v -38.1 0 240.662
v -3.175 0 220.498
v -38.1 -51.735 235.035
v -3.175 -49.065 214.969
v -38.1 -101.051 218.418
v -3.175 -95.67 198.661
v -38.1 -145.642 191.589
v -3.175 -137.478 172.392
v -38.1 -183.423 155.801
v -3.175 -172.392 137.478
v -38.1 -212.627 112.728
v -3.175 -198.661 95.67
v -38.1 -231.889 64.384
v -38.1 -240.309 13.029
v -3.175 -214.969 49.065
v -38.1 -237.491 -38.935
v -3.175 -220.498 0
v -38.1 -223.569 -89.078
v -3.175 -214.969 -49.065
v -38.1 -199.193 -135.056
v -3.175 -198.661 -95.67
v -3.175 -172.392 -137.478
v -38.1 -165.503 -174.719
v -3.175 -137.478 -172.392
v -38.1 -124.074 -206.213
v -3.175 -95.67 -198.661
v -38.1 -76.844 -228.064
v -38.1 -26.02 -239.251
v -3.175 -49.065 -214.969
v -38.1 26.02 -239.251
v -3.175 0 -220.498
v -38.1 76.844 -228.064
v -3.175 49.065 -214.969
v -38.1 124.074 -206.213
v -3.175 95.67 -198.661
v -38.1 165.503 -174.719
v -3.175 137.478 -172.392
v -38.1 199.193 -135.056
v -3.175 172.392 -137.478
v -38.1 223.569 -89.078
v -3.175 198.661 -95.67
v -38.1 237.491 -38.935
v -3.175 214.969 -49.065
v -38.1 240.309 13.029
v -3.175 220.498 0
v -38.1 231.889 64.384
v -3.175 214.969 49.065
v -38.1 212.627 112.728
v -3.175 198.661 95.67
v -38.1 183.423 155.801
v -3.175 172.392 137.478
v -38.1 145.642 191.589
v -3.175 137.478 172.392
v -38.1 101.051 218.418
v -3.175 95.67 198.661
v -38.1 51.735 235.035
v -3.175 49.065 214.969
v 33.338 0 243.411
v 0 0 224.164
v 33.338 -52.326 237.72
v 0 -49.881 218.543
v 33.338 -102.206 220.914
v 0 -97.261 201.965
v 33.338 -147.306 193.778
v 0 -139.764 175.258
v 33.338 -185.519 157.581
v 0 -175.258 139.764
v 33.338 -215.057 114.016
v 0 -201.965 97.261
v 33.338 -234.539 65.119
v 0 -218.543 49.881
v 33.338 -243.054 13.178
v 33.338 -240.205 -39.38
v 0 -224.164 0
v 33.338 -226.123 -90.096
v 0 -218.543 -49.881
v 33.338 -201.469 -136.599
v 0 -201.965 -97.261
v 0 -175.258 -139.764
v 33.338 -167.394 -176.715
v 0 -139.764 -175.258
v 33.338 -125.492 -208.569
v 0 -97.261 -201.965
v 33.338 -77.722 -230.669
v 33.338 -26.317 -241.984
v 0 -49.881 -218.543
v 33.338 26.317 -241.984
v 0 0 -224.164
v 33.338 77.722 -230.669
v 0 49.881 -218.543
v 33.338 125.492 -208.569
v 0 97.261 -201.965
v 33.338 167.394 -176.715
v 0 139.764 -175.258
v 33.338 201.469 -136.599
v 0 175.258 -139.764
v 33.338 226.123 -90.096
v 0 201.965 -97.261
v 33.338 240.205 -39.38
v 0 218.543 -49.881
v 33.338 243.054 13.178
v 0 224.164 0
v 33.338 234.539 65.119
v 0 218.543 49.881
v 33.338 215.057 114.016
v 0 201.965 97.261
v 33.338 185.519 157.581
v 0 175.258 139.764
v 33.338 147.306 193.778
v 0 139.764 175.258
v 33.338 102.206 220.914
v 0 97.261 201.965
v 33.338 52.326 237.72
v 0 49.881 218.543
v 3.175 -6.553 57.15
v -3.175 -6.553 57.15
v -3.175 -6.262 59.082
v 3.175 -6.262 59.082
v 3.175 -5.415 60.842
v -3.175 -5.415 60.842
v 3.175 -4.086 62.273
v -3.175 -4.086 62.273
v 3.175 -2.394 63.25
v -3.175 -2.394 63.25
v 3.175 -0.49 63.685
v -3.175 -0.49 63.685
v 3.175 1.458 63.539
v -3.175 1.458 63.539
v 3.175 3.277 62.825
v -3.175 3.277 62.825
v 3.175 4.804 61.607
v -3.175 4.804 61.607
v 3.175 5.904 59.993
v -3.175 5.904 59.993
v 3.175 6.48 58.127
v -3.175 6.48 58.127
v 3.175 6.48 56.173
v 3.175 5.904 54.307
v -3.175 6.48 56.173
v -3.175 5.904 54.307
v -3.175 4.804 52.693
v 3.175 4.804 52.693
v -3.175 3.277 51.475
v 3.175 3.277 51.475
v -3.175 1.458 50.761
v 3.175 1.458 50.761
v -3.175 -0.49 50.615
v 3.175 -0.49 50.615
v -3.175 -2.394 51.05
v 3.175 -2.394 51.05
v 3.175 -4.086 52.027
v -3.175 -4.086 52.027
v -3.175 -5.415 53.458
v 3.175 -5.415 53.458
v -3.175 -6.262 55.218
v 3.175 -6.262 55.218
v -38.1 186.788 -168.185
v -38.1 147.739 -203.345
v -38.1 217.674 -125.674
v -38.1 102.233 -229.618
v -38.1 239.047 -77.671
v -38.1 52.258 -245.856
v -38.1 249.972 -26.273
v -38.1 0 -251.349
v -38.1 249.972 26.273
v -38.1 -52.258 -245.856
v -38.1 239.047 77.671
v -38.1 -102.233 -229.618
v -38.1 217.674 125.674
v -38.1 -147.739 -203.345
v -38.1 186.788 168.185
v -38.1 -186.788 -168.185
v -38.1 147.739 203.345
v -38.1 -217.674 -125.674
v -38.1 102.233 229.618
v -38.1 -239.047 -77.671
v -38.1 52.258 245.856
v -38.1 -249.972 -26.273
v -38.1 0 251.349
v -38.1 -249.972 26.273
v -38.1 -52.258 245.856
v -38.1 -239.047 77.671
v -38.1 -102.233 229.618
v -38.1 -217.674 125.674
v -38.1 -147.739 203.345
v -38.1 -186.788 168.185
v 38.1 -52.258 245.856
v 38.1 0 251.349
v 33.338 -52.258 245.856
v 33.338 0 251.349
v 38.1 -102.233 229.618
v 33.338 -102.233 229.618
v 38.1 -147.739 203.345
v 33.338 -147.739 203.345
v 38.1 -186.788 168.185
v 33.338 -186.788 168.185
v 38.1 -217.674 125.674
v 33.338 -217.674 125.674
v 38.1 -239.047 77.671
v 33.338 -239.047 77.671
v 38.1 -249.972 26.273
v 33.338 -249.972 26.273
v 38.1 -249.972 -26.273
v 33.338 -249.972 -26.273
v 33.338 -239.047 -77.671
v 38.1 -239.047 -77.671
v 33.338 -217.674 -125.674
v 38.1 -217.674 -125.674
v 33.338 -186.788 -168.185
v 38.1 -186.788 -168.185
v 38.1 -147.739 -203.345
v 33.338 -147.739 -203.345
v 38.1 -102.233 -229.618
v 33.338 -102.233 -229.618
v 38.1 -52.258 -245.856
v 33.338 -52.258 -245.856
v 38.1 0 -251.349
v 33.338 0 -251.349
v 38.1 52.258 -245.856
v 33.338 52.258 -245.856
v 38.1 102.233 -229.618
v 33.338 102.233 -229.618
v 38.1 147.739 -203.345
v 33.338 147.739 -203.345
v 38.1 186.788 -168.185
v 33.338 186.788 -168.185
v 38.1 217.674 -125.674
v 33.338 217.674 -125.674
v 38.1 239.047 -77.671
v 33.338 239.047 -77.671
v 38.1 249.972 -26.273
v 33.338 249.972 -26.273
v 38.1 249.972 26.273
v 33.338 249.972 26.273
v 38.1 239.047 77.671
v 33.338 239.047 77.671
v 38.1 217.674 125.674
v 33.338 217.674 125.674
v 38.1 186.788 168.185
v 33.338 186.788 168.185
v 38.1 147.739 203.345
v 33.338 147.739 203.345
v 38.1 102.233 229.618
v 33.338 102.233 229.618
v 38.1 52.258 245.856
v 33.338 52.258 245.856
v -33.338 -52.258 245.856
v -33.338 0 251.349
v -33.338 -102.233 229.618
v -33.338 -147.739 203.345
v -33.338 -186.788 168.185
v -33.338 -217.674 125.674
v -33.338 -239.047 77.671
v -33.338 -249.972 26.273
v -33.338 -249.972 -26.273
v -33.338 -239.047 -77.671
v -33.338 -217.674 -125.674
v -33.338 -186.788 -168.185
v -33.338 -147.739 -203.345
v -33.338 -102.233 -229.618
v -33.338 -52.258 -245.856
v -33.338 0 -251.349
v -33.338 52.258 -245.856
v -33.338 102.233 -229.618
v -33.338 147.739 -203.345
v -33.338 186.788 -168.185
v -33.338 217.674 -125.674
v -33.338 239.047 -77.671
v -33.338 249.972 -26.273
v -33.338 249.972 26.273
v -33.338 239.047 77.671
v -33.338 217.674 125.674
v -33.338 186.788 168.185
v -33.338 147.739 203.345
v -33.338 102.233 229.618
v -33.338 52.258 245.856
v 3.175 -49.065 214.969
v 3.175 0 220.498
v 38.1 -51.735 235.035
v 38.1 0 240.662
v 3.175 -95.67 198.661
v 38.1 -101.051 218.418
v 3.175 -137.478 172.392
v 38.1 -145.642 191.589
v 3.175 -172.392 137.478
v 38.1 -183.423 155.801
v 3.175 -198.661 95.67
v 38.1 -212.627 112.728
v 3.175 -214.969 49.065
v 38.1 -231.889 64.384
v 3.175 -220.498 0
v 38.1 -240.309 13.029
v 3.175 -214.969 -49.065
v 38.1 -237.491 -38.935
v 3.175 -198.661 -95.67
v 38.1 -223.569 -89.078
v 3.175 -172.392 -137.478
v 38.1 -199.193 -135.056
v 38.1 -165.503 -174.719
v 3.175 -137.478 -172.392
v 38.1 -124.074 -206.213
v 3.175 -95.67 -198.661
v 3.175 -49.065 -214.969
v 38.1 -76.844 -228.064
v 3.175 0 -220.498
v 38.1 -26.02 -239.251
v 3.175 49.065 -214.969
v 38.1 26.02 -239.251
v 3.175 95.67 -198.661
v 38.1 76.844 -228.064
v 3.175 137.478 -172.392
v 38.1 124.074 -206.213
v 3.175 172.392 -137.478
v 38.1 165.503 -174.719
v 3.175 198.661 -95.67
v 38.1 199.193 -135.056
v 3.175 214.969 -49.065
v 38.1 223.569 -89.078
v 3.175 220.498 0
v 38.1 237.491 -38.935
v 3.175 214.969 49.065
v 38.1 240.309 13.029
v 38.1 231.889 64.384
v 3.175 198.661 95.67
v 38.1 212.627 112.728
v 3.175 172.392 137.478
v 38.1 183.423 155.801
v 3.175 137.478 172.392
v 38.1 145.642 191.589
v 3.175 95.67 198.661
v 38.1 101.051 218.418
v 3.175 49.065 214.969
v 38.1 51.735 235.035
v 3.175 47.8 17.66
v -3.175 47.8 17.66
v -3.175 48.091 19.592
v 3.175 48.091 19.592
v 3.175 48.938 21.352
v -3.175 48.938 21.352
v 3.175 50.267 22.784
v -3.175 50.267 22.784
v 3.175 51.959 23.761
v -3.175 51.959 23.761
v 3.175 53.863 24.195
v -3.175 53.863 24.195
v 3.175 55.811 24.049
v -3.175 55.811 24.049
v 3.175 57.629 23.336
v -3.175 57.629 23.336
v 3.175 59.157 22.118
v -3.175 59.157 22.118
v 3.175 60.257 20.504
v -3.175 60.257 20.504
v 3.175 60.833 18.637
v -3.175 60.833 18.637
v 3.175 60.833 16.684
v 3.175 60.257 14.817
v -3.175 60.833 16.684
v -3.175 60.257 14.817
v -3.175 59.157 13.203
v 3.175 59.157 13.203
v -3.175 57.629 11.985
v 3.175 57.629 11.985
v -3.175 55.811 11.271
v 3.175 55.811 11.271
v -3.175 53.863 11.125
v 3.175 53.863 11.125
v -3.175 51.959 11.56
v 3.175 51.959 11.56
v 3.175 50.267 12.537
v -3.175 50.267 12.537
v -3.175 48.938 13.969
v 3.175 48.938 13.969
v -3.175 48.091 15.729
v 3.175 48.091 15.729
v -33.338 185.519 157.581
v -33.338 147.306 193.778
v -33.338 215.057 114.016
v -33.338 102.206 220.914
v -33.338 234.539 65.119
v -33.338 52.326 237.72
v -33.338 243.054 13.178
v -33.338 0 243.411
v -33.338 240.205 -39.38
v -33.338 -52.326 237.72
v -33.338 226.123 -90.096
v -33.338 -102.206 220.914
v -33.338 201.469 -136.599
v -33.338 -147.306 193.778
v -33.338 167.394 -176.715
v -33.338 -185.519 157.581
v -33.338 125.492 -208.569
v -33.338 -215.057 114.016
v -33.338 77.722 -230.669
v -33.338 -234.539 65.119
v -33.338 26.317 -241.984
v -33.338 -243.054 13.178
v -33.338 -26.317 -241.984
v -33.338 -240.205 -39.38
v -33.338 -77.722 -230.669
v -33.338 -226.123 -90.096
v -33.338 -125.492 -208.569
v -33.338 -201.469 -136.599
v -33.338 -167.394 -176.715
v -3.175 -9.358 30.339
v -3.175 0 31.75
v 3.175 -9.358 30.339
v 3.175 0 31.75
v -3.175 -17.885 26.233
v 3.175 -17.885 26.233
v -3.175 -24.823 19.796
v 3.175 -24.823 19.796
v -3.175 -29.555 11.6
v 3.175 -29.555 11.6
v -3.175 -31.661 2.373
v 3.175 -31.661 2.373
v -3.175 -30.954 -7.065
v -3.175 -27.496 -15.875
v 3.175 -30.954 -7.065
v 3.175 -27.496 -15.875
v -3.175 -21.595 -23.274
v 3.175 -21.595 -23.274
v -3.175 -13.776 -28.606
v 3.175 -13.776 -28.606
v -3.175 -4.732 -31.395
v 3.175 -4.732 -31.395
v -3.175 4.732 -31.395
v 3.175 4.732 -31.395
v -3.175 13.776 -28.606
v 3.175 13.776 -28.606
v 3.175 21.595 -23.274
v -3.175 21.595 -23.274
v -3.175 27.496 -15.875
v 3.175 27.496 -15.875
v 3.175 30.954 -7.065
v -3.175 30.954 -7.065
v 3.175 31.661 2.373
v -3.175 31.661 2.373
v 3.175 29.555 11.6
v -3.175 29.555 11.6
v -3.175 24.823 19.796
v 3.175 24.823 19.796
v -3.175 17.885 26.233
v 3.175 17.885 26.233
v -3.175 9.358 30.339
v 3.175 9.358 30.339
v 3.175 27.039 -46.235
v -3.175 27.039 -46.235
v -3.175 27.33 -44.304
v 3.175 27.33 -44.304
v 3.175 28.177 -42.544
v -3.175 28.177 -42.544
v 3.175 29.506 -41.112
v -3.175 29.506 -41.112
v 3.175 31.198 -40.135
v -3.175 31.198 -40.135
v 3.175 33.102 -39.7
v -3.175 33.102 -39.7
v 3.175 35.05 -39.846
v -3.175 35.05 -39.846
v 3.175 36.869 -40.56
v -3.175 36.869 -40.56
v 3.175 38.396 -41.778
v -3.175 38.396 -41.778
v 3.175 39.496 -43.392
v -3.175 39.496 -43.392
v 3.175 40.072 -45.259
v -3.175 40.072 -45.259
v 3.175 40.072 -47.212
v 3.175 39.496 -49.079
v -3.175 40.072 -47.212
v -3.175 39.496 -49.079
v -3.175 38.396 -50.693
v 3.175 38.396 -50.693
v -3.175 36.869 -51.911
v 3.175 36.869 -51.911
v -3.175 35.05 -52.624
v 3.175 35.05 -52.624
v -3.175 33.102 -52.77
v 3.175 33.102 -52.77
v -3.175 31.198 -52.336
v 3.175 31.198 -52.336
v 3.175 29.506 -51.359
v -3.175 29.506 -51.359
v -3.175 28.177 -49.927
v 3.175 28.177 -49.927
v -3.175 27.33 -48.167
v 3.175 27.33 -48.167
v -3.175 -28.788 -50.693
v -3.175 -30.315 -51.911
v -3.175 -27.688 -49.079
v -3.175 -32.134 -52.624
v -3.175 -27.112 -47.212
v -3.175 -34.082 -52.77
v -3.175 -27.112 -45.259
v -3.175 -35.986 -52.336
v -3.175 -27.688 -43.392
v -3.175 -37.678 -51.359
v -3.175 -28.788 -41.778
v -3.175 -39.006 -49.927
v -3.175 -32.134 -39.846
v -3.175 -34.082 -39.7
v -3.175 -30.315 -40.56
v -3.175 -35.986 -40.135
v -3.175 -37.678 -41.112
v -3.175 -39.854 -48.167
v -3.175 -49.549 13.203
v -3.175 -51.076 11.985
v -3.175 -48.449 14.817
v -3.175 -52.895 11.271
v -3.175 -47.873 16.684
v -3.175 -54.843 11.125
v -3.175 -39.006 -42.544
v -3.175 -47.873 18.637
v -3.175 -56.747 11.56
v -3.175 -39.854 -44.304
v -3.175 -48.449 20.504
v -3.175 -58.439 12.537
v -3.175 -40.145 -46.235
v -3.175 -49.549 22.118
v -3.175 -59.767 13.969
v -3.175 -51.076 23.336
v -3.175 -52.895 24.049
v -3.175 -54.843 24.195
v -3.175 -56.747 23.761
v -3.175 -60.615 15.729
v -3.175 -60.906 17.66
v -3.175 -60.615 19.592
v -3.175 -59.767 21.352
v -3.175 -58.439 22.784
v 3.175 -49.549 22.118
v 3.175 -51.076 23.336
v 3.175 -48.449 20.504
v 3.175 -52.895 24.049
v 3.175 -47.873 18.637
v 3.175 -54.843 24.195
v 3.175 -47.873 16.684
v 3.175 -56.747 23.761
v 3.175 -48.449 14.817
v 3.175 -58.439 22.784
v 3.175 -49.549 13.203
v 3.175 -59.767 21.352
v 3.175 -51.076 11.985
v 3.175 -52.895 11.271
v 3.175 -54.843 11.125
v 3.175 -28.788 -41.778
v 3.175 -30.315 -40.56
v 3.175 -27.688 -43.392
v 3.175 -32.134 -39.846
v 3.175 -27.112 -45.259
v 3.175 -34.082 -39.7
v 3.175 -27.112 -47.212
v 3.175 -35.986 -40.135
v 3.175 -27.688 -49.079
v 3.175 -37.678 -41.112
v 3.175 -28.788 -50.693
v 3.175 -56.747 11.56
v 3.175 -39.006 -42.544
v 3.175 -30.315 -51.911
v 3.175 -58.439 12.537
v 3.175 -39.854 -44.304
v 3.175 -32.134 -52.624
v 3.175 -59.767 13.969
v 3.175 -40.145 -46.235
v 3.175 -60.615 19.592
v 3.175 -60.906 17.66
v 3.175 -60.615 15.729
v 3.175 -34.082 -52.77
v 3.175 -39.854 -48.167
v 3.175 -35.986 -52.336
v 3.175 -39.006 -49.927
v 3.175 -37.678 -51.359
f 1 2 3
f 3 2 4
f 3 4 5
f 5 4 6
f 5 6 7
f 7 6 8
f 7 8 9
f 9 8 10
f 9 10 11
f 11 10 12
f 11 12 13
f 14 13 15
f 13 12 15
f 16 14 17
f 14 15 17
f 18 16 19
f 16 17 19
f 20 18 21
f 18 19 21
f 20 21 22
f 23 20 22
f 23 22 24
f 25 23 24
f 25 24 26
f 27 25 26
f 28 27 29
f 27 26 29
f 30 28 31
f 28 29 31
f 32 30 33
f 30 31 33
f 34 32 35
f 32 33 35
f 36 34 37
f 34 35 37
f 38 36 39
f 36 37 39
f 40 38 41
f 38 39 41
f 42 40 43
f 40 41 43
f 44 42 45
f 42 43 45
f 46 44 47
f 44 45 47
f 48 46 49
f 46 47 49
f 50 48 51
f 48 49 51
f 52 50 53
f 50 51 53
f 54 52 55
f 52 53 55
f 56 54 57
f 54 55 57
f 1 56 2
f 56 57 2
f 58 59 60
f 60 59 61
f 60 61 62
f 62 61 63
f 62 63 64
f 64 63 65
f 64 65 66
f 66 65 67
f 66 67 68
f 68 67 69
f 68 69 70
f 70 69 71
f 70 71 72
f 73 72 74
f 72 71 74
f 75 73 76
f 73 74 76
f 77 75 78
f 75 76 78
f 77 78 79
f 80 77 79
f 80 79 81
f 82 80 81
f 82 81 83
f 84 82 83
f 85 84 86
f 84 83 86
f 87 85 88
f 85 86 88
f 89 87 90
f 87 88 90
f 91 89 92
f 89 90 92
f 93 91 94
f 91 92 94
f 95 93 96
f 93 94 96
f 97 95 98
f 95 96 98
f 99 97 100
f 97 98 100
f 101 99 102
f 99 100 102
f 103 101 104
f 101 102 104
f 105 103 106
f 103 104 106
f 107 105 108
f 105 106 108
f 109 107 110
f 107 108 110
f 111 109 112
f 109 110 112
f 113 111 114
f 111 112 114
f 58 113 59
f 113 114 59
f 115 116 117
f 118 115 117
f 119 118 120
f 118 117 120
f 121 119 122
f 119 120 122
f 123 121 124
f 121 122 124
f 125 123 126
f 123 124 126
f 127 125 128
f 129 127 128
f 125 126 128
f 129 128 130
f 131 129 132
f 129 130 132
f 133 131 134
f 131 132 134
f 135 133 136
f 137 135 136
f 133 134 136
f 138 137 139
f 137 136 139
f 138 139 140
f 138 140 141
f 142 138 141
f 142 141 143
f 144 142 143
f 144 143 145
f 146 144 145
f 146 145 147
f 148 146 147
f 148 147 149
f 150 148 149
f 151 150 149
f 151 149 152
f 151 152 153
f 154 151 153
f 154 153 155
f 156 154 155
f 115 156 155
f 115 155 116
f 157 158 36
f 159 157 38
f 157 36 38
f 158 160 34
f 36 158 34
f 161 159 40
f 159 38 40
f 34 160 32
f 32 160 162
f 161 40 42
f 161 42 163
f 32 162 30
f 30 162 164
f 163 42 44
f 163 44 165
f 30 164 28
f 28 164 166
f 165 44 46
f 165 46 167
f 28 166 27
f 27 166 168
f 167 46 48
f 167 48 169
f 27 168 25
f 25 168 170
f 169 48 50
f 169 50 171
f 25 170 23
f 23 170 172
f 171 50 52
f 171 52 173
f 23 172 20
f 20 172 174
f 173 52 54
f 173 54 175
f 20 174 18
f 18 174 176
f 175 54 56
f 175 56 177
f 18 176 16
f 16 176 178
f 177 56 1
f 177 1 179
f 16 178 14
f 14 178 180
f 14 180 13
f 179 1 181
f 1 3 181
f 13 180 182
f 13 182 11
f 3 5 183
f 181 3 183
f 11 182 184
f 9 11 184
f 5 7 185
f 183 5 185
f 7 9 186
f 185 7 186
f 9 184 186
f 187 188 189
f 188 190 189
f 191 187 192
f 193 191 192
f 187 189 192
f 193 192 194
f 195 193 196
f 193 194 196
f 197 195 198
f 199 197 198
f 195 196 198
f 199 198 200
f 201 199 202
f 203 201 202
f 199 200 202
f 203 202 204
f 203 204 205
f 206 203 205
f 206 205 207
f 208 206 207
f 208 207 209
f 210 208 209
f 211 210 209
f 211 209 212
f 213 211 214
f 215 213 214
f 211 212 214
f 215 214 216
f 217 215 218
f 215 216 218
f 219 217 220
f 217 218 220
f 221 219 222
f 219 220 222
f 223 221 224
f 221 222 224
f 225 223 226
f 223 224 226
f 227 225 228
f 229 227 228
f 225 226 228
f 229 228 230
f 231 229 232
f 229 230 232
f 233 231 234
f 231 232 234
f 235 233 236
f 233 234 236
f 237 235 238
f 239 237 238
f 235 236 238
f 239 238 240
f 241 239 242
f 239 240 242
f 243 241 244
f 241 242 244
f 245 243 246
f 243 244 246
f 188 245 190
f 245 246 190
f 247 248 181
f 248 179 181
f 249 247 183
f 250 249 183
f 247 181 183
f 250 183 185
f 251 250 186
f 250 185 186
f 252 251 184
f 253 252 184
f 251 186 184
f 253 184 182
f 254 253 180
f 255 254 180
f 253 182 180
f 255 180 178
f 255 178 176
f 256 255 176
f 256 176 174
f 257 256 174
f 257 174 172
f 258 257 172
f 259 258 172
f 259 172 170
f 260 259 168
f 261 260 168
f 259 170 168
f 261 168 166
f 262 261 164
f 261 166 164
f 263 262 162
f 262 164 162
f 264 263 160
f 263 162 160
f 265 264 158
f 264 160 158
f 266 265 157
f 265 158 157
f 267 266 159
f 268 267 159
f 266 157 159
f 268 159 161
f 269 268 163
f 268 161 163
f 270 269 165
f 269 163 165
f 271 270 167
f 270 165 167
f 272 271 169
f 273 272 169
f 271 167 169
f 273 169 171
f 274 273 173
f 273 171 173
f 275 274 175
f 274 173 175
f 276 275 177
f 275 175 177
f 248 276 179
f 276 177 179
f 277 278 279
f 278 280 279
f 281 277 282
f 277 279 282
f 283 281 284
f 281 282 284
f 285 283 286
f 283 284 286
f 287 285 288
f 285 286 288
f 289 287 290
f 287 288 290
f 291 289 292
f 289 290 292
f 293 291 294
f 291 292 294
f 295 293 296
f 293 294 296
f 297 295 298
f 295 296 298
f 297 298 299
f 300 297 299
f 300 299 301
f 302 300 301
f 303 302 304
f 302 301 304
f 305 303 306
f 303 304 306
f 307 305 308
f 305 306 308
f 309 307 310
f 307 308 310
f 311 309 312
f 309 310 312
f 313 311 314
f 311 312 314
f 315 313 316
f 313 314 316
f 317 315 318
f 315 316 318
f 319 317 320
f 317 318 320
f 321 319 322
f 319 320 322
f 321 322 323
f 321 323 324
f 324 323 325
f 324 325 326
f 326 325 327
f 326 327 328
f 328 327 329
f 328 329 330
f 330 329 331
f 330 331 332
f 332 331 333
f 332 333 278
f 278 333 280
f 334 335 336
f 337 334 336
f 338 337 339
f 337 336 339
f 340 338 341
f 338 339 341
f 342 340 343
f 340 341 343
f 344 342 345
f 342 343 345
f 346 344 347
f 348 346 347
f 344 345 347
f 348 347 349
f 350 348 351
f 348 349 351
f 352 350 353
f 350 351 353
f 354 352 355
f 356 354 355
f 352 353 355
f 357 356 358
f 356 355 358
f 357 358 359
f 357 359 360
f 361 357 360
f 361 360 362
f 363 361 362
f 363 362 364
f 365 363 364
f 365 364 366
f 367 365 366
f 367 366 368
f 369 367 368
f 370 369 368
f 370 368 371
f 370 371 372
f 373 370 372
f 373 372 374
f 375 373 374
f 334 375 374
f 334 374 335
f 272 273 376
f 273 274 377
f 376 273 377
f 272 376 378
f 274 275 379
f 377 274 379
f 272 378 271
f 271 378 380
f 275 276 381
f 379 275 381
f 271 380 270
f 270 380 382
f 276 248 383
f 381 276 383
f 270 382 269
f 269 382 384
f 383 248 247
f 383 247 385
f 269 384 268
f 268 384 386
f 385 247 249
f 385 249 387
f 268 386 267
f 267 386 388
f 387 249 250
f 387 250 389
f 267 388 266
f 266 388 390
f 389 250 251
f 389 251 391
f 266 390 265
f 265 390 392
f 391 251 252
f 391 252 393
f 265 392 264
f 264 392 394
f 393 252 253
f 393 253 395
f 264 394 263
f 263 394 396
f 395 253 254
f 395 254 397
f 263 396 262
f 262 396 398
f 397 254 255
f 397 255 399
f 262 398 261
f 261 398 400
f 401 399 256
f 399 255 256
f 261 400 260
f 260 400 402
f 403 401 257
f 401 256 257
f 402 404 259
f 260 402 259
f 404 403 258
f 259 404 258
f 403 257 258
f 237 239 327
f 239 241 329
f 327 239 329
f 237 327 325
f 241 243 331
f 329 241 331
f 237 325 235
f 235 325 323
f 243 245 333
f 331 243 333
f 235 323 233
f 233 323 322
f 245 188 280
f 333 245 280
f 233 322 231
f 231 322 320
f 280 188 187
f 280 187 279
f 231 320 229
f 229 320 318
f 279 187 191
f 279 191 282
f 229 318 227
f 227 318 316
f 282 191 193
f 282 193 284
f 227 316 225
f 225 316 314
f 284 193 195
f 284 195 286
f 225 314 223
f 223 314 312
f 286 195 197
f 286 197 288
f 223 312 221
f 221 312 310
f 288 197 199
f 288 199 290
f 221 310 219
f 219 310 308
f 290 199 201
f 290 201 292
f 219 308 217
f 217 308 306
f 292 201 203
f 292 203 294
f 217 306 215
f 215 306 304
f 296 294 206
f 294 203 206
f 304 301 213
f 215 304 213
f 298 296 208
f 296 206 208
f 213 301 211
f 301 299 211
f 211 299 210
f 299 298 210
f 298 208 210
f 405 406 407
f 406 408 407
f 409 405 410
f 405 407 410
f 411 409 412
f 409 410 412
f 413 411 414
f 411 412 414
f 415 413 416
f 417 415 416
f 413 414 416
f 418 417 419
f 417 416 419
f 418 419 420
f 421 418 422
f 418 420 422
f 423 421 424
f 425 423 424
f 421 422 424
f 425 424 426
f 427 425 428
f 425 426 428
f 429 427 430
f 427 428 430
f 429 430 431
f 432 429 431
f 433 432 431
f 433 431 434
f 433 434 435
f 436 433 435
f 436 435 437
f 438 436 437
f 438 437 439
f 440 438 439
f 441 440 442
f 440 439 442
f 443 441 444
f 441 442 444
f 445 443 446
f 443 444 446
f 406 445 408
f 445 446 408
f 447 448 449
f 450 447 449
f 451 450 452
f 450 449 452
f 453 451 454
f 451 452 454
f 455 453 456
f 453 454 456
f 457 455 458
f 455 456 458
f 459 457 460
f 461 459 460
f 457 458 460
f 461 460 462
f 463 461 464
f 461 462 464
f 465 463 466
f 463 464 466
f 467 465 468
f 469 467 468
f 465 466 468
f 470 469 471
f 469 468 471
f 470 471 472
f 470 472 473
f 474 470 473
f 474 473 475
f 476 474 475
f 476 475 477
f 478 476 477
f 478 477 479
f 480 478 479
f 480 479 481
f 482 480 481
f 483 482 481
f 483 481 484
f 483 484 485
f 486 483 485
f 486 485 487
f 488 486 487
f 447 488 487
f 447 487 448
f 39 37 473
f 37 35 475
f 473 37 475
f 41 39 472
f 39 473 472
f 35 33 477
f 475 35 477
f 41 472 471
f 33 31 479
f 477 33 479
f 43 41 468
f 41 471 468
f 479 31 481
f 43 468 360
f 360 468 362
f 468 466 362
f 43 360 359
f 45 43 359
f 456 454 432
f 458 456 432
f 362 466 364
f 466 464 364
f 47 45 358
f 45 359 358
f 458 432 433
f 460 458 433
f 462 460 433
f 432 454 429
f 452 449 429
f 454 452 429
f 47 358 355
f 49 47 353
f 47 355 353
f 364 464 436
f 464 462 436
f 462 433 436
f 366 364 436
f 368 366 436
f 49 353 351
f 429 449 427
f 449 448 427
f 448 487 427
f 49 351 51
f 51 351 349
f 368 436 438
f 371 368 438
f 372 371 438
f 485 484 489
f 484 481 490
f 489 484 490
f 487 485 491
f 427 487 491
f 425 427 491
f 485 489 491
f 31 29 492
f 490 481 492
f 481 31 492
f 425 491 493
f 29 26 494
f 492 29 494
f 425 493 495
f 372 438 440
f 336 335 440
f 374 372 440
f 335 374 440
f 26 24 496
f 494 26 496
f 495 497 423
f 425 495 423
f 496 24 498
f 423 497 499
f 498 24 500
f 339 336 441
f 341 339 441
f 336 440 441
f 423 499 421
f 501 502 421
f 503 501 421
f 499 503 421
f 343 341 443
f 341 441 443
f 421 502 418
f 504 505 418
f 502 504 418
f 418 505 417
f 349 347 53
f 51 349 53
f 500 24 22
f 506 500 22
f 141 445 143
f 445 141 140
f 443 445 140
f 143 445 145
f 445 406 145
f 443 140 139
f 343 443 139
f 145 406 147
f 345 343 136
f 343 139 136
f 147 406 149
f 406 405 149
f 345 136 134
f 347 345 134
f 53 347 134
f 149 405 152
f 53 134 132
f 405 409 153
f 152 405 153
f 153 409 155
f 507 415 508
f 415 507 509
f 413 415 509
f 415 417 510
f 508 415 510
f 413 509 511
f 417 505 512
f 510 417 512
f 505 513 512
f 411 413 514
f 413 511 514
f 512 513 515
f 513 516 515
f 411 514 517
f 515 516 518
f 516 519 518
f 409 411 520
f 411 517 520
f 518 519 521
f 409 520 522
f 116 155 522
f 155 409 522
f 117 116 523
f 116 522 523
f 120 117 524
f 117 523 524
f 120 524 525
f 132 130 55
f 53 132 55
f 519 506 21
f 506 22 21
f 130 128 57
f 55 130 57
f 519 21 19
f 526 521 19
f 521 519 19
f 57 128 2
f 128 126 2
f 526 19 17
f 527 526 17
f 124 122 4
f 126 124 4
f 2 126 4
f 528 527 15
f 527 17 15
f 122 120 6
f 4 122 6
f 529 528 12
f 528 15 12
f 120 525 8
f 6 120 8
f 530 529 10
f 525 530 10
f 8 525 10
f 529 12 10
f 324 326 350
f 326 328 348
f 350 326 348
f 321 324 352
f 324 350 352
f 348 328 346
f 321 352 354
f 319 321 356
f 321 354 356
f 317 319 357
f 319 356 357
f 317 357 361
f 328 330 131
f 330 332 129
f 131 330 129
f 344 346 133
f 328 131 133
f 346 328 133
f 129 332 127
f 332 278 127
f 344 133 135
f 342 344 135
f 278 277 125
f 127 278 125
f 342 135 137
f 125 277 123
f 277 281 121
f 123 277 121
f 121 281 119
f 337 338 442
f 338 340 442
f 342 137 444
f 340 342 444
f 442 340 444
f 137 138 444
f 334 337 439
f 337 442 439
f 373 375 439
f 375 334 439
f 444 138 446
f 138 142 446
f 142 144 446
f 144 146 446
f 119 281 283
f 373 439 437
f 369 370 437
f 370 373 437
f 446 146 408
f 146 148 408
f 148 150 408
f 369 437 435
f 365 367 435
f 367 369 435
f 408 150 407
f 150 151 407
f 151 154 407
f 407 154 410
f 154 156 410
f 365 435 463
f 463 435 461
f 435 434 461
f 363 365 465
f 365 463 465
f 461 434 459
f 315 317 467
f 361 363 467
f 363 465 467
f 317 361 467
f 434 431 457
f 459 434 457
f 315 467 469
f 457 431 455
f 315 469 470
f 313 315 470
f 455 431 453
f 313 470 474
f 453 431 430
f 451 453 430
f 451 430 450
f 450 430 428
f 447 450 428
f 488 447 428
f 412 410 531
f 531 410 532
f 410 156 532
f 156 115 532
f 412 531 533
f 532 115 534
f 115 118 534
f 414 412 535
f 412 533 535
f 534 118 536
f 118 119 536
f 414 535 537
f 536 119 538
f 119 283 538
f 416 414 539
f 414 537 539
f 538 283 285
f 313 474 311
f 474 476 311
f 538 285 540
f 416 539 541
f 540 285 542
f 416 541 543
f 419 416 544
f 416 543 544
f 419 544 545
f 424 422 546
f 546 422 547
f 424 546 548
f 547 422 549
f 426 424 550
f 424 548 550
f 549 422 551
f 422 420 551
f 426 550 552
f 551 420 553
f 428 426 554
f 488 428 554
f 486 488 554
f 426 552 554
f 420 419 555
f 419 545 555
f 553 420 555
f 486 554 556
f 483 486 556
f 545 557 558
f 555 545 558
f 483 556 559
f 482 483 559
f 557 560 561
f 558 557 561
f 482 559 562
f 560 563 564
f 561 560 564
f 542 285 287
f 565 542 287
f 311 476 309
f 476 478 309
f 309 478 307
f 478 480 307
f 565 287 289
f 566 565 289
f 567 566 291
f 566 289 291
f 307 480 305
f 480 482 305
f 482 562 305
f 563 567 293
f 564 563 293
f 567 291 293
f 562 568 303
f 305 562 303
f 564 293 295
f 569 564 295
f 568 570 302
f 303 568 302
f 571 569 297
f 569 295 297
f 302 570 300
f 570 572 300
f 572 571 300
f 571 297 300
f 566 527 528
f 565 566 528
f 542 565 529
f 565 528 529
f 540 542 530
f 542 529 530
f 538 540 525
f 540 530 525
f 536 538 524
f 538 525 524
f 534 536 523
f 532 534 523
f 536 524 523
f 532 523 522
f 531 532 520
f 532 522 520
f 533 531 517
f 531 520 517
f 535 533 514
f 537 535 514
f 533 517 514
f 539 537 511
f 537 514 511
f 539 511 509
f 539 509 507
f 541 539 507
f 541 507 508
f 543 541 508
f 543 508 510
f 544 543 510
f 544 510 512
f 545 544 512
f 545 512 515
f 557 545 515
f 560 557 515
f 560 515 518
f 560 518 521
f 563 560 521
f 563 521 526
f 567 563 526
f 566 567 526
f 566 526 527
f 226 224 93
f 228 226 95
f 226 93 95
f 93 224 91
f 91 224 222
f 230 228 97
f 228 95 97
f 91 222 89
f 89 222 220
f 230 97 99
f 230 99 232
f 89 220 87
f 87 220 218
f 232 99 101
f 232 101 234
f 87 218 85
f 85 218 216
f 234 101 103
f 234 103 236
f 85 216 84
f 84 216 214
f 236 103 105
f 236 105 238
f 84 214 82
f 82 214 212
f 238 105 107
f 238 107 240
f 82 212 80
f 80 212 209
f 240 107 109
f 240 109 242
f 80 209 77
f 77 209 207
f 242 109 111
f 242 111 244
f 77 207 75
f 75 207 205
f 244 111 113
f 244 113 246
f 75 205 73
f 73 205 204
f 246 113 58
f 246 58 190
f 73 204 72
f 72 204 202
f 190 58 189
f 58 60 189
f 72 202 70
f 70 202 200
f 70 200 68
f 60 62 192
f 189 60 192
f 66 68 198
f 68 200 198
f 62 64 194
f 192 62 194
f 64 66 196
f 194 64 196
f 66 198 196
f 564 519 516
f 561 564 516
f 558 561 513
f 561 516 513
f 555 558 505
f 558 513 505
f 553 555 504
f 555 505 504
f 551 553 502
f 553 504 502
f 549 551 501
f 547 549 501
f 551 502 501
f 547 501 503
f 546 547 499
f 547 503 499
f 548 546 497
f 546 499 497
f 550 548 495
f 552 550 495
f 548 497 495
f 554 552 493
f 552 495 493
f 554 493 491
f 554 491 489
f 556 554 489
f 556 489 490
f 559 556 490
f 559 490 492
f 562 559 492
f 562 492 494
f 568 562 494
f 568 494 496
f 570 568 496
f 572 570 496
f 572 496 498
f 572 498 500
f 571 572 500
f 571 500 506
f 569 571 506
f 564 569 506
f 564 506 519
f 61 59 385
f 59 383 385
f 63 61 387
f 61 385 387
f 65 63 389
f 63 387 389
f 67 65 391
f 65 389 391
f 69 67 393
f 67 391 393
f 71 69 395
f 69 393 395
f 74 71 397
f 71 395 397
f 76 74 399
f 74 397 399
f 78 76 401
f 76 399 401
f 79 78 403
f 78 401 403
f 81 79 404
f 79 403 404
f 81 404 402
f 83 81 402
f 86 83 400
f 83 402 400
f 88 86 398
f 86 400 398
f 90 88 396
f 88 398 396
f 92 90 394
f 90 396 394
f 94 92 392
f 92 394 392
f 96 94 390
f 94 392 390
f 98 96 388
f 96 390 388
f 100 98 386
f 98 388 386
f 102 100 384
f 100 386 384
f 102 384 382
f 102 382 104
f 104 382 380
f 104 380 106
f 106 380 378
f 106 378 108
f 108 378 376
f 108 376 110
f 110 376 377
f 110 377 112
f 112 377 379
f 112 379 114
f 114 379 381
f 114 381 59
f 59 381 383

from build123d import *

# Parameters (mm, degrees)
F3_D = 13.1064


with BuildPart() as f1:
    # F0 (on Front) → F1 (revolve)
    with BuildSketch(Plane.XZ):
        Polygon((-3.175, 220.4975482247), (-3.175, 31.75), (3.175, 31.75), (3.175, 220.4975482247), (38.1, 240.6615063761), (38.1, 251.3486370331), (33.3375, 251.3486370331), (33.3375, 243.4111370331), (0, 224.163722434), (-33.3375, 243.4111370331), (-33.3375, 251.3486370331), (-38.1, 251.3486370331), (-38.1, 240.6615063761), align=None)
    revolve(axis=Axis((42.5242893398, 0, 0), (1, 0, 0)))

    # F3 (through all)
    with Locations(Plane.YZ.offset(3.175)):
        with Locations((0, 57.15), (54.3528799063, 17.6603212285), (33.5919271685, -46.2353212285), (-33.5919271685, -46.2353212285), (-54.3528799063, 17.6603212285)):
            Hole(F3_D / 2)


solid = f1.part
